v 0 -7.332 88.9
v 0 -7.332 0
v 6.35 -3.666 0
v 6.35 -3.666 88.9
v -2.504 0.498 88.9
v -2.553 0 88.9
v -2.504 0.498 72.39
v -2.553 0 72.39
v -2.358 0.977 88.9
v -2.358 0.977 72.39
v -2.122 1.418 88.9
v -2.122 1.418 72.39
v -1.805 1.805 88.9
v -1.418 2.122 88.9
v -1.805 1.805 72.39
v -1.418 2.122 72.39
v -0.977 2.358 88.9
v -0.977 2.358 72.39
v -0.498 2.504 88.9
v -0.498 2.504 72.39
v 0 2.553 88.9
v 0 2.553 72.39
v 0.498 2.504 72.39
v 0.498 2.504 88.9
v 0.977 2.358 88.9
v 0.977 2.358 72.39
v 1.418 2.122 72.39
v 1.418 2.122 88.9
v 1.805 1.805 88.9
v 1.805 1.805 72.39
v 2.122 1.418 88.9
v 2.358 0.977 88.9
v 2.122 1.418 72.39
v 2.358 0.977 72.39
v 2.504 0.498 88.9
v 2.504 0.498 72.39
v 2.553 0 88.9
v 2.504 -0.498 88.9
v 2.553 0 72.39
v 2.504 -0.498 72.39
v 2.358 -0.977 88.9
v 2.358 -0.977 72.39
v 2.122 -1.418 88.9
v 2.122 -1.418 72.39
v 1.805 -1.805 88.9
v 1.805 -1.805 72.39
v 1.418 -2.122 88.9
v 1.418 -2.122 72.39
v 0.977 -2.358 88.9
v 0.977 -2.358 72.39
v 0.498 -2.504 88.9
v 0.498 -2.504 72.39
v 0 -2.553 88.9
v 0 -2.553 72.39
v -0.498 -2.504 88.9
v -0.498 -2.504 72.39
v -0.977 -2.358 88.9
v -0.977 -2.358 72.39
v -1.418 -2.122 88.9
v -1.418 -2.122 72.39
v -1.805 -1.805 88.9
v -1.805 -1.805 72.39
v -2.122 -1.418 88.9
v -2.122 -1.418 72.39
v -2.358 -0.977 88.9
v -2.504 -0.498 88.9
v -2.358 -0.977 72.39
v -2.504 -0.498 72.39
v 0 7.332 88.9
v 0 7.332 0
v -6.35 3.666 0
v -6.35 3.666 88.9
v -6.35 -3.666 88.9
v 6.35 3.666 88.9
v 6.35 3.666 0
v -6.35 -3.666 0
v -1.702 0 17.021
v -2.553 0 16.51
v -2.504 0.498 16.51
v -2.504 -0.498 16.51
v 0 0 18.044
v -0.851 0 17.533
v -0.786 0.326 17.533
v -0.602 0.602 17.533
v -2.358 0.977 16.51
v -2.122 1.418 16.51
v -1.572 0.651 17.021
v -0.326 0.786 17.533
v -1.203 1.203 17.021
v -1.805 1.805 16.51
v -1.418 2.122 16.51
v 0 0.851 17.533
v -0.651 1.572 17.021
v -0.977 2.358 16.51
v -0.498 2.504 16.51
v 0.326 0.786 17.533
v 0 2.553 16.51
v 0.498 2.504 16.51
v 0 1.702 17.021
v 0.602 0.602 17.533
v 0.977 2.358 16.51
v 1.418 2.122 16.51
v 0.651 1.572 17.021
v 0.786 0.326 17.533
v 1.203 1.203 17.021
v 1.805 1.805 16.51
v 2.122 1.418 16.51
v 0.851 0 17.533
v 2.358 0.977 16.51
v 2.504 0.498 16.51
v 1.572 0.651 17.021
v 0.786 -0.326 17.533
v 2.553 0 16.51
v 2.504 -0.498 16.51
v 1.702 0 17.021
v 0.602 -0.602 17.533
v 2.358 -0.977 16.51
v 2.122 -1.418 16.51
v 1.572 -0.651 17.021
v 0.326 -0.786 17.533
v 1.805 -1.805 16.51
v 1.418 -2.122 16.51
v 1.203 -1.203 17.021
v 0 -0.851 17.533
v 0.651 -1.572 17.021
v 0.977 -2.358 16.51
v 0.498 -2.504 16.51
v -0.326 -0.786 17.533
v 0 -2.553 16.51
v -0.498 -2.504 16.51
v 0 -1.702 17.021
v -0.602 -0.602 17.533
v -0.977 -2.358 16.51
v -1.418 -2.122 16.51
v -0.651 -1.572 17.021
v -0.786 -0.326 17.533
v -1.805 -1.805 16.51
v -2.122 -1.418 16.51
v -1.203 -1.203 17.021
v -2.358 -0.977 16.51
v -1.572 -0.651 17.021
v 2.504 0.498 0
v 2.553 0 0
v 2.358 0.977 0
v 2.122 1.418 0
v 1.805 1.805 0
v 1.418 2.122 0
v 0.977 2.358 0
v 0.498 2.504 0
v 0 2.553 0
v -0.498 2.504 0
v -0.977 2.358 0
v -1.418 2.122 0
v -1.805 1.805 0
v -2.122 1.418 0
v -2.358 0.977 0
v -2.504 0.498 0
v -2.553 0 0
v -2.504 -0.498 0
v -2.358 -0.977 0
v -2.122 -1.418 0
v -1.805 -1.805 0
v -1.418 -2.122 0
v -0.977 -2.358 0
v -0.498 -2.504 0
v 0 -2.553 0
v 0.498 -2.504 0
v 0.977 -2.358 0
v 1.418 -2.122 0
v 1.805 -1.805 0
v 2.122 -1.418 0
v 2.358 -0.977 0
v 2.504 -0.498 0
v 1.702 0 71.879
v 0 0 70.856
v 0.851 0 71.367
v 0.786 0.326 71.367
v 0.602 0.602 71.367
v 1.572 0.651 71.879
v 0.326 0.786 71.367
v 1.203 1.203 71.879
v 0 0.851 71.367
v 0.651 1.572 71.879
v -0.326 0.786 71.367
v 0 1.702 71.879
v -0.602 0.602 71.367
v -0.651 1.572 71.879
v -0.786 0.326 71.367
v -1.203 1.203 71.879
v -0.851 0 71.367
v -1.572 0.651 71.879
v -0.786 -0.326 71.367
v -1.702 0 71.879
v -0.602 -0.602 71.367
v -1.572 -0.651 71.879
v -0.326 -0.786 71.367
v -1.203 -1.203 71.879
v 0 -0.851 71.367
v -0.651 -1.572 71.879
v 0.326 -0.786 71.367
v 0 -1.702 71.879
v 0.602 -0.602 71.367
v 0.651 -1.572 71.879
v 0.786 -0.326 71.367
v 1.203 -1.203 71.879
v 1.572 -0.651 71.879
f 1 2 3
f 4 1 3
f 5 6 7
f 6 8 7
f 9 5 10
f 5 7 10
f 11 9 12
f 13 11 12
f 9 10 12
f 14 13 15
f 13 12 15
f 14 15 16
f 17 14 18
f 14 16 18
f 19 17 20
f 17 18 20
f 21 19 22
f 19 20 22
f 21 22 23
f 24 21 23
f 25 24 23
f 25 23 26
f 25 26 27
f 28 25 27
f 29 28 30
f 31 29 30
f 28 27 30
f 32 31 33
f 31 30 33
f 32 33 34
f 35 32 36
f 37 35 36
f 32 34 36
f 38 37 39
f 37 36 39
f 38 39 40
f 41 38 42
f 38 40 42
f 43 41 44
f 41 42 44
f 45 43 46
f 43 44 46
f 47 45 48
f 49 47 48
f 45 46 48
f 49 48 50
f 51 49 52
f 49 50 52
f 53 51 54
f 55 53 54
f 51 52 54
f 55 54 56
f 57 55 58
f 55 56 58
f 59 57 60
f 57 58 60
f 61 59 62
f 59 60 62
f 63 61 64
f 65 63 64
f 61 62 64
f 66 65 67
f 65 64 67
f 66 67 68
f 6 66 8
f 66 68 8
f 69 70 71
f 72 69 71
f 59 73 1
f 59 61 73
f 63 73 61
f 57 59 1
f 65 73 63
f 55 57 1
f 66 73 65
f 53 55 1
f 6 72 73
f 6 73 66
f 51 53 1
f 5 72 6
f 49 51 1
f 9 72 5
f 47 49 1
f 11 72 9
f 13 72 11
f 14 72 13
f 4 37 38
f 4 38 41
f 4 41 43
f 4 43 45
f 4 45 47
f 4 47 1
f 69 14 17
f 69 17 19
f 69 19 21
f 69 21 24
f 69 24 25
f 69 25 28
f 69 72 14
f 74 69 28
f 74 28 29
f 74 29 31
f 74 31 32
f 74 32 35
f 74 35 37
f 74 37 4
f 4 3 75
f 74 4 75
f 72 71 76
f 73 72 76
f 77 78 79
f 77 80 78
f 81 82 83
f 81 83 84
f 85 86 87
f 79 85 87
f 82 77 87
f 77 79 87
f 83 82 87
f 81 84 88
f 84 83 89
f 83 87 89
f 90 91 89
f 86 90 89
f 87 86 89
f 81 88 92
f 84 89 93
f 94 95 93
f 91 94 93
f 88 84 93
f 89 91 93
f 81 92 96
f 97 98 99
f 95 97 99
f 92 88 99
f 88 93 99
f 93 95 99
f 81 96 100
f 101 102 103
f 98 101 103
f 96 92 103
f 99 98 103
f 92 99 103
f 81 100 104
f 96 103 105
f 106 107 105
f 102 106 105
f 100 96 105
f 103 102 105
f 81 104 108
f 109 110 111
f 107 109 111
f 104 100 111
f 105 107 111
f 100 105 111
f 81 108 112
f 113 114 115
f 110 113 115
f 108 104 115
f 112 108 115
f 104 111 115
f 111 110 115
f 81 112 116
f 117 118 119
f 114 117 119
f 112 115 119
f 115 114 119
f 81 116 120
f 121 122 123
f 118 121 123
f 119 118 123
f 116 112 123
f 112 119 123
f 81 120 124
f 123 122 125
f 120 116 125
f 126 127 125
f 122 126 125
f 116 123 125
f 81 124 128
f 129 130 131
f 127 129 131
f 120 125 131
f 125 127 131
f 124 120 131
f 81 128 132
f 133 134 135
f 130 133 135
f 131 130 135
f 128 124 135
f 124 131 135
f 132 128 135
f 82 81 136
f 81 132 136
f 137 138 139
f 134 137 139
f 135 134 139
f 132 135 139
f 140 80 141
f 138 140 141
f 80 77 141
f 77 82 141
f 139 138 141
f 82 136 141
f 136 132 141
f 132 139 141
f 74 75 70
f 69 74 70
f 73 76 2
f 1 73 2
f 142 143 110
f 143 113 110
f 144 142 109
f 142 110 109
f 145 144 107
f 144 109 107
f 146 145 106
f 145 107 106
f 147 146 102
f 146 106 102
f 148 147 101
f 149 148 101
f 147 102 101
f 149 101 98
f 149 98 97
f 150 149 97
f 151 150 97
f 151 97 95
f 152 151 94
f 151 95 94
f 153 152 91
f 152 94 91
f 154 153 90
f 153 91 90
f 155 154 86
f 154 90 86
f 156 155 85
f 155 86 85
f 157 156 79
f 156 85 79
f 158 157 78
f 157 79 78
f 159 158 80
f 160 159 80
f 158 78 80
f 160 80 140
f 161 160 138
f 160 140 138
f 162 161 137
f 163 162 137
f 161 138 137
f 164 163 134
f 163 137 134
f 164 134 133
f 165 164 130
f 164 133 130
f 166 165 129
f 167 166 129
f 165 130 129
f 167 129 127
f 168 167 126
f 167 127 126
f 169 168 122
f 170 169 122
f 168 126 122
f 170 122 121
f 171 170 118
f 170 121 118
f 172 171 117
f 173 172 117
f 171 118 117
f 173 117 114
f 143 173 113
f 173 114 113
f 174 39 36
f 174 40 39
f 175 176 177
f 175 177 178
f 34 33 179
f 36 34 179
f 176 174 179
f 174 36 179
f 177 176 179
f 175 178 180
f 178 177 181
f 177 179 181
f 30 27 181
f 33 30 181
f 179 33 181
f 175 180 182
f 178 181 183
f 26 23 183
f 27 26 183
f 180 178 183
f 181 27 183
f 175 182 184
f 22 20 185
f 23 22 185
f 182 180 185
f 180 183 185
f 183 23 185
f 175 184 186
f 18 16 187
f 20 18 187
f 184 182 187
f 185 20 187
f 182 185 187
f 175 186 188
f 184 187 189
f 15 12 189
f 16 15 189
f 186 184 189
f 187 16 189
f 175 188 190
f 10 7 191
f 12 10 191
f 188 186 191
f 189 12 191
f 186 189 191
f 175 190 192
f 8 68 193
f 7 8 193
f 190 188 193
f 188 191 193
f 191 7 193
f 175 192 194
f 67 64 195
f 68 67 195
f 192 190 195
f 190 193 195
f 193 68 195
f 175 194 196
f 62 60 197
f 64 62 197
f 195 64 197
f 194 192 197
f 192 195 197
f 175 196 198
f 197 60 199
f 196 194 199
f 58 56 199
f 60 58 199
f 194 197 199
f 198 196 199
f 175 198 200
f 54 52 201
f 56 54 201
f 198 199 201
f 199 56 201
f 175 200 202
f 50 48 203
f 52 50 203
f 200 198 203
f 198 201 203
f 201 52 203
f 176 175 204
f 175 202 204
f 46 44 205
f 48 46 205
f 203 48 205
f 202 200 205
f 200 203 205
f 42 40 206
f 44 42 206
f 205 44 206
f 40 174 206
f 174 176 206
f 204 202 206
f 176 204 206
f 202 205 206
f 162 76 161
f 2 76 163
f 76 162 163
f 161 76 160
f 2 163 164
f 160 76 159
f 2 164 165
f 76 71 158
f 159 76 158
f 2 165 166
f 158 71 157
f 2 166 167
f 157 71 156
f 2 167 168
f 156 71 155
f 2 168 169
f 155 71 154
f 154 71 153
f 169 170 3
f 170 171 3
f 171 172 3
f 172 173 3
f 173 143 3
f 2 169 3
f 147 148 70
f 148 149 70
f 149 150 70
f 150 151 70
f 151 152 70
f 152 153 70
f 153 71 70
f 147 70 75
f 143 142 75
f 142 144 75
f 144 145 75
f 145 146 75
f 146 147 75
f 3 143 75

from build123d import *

# Parameters (mm, degrees)
BOSS_EXTRUDE1_DEPTH         = 88.9
F_1_4_20_TAPPED_HOLE1_D     = 5.1054
F_1_4_20_TAPPED_HOLE1_DEPTH = 16.51
F_1_4_20_TAPPED_HOLE1_TIP   = 1.533816902
F_1_4_20_TAPPED_HOLE2_D     = 5.1054
F_1_4_20_TAPPED_HOLE2_DEPTH = 16.51
F_1_4_20_TAPPED_HOLE2_TIP   = 1.533816902


with BuildPart() as part:
    # Sketch1 → Boss-Extrude1 (new body)
    with BuildSketch(Plane.XY):
        Polygon((6.35, 3.666174209), (0, 7.332348419), (-6.35, 3.666174209), (-6.35, -3.666174209), (0, -7.332348419), (6.35, -3.666174209), align=None)
    extrude(amount=BOSS_EXTRUDE1_DEPTH)

    # 1/4-20 Tapped Hole1
    with Locations(Plane.XY.offset(88.9)):
        with Locations((0, 0)):
            Hole(F_1_4_20_TAPPED_HOLE1_D / 2, depth=F_1_4_20_TAPPED_HOLE1_DEPTH)
            with Locations((0, 0, -(F_1_4_20_TAPPED_HOLE1_DEPTH + F_1_4_20_TAPPED_HOLE1_TIP / 2))):  # 118° drill point
                Cone(0, F_1_4_20_TAPPED_HOLE1_D / 2, F_1_4_20_TAPPED_HOLE1_TIP, mode=Mode.SUBTRACT)

    # 1/4-20 Tapped Hole2
    with Locations(Plane(origin=(0, 0, 0), x_dir=(-1, 0, 0), z_dir=(0, 0, -1))):
        with Locations((0, 0)):
            Hole(F_1_4_20_TAPPED_HOLE2_D / 2, depth=F_1_4_20_TAPPED_HOLE2_DEPTH)
            with Locations((0, 0, -(F_1_4_20_TAPPED_HOLE2_DEPTH + F_1_4_20_TAPPED_HOLE2_TIP / 2))):  # 118° drill point
                Cone(0, F_1_4_20_TAPPED_HOLE2_D / 2, F_1_4_20_TAPPED_HOLE2_TIP, mode=Mode.SUBTRACT)


solid = part.part
